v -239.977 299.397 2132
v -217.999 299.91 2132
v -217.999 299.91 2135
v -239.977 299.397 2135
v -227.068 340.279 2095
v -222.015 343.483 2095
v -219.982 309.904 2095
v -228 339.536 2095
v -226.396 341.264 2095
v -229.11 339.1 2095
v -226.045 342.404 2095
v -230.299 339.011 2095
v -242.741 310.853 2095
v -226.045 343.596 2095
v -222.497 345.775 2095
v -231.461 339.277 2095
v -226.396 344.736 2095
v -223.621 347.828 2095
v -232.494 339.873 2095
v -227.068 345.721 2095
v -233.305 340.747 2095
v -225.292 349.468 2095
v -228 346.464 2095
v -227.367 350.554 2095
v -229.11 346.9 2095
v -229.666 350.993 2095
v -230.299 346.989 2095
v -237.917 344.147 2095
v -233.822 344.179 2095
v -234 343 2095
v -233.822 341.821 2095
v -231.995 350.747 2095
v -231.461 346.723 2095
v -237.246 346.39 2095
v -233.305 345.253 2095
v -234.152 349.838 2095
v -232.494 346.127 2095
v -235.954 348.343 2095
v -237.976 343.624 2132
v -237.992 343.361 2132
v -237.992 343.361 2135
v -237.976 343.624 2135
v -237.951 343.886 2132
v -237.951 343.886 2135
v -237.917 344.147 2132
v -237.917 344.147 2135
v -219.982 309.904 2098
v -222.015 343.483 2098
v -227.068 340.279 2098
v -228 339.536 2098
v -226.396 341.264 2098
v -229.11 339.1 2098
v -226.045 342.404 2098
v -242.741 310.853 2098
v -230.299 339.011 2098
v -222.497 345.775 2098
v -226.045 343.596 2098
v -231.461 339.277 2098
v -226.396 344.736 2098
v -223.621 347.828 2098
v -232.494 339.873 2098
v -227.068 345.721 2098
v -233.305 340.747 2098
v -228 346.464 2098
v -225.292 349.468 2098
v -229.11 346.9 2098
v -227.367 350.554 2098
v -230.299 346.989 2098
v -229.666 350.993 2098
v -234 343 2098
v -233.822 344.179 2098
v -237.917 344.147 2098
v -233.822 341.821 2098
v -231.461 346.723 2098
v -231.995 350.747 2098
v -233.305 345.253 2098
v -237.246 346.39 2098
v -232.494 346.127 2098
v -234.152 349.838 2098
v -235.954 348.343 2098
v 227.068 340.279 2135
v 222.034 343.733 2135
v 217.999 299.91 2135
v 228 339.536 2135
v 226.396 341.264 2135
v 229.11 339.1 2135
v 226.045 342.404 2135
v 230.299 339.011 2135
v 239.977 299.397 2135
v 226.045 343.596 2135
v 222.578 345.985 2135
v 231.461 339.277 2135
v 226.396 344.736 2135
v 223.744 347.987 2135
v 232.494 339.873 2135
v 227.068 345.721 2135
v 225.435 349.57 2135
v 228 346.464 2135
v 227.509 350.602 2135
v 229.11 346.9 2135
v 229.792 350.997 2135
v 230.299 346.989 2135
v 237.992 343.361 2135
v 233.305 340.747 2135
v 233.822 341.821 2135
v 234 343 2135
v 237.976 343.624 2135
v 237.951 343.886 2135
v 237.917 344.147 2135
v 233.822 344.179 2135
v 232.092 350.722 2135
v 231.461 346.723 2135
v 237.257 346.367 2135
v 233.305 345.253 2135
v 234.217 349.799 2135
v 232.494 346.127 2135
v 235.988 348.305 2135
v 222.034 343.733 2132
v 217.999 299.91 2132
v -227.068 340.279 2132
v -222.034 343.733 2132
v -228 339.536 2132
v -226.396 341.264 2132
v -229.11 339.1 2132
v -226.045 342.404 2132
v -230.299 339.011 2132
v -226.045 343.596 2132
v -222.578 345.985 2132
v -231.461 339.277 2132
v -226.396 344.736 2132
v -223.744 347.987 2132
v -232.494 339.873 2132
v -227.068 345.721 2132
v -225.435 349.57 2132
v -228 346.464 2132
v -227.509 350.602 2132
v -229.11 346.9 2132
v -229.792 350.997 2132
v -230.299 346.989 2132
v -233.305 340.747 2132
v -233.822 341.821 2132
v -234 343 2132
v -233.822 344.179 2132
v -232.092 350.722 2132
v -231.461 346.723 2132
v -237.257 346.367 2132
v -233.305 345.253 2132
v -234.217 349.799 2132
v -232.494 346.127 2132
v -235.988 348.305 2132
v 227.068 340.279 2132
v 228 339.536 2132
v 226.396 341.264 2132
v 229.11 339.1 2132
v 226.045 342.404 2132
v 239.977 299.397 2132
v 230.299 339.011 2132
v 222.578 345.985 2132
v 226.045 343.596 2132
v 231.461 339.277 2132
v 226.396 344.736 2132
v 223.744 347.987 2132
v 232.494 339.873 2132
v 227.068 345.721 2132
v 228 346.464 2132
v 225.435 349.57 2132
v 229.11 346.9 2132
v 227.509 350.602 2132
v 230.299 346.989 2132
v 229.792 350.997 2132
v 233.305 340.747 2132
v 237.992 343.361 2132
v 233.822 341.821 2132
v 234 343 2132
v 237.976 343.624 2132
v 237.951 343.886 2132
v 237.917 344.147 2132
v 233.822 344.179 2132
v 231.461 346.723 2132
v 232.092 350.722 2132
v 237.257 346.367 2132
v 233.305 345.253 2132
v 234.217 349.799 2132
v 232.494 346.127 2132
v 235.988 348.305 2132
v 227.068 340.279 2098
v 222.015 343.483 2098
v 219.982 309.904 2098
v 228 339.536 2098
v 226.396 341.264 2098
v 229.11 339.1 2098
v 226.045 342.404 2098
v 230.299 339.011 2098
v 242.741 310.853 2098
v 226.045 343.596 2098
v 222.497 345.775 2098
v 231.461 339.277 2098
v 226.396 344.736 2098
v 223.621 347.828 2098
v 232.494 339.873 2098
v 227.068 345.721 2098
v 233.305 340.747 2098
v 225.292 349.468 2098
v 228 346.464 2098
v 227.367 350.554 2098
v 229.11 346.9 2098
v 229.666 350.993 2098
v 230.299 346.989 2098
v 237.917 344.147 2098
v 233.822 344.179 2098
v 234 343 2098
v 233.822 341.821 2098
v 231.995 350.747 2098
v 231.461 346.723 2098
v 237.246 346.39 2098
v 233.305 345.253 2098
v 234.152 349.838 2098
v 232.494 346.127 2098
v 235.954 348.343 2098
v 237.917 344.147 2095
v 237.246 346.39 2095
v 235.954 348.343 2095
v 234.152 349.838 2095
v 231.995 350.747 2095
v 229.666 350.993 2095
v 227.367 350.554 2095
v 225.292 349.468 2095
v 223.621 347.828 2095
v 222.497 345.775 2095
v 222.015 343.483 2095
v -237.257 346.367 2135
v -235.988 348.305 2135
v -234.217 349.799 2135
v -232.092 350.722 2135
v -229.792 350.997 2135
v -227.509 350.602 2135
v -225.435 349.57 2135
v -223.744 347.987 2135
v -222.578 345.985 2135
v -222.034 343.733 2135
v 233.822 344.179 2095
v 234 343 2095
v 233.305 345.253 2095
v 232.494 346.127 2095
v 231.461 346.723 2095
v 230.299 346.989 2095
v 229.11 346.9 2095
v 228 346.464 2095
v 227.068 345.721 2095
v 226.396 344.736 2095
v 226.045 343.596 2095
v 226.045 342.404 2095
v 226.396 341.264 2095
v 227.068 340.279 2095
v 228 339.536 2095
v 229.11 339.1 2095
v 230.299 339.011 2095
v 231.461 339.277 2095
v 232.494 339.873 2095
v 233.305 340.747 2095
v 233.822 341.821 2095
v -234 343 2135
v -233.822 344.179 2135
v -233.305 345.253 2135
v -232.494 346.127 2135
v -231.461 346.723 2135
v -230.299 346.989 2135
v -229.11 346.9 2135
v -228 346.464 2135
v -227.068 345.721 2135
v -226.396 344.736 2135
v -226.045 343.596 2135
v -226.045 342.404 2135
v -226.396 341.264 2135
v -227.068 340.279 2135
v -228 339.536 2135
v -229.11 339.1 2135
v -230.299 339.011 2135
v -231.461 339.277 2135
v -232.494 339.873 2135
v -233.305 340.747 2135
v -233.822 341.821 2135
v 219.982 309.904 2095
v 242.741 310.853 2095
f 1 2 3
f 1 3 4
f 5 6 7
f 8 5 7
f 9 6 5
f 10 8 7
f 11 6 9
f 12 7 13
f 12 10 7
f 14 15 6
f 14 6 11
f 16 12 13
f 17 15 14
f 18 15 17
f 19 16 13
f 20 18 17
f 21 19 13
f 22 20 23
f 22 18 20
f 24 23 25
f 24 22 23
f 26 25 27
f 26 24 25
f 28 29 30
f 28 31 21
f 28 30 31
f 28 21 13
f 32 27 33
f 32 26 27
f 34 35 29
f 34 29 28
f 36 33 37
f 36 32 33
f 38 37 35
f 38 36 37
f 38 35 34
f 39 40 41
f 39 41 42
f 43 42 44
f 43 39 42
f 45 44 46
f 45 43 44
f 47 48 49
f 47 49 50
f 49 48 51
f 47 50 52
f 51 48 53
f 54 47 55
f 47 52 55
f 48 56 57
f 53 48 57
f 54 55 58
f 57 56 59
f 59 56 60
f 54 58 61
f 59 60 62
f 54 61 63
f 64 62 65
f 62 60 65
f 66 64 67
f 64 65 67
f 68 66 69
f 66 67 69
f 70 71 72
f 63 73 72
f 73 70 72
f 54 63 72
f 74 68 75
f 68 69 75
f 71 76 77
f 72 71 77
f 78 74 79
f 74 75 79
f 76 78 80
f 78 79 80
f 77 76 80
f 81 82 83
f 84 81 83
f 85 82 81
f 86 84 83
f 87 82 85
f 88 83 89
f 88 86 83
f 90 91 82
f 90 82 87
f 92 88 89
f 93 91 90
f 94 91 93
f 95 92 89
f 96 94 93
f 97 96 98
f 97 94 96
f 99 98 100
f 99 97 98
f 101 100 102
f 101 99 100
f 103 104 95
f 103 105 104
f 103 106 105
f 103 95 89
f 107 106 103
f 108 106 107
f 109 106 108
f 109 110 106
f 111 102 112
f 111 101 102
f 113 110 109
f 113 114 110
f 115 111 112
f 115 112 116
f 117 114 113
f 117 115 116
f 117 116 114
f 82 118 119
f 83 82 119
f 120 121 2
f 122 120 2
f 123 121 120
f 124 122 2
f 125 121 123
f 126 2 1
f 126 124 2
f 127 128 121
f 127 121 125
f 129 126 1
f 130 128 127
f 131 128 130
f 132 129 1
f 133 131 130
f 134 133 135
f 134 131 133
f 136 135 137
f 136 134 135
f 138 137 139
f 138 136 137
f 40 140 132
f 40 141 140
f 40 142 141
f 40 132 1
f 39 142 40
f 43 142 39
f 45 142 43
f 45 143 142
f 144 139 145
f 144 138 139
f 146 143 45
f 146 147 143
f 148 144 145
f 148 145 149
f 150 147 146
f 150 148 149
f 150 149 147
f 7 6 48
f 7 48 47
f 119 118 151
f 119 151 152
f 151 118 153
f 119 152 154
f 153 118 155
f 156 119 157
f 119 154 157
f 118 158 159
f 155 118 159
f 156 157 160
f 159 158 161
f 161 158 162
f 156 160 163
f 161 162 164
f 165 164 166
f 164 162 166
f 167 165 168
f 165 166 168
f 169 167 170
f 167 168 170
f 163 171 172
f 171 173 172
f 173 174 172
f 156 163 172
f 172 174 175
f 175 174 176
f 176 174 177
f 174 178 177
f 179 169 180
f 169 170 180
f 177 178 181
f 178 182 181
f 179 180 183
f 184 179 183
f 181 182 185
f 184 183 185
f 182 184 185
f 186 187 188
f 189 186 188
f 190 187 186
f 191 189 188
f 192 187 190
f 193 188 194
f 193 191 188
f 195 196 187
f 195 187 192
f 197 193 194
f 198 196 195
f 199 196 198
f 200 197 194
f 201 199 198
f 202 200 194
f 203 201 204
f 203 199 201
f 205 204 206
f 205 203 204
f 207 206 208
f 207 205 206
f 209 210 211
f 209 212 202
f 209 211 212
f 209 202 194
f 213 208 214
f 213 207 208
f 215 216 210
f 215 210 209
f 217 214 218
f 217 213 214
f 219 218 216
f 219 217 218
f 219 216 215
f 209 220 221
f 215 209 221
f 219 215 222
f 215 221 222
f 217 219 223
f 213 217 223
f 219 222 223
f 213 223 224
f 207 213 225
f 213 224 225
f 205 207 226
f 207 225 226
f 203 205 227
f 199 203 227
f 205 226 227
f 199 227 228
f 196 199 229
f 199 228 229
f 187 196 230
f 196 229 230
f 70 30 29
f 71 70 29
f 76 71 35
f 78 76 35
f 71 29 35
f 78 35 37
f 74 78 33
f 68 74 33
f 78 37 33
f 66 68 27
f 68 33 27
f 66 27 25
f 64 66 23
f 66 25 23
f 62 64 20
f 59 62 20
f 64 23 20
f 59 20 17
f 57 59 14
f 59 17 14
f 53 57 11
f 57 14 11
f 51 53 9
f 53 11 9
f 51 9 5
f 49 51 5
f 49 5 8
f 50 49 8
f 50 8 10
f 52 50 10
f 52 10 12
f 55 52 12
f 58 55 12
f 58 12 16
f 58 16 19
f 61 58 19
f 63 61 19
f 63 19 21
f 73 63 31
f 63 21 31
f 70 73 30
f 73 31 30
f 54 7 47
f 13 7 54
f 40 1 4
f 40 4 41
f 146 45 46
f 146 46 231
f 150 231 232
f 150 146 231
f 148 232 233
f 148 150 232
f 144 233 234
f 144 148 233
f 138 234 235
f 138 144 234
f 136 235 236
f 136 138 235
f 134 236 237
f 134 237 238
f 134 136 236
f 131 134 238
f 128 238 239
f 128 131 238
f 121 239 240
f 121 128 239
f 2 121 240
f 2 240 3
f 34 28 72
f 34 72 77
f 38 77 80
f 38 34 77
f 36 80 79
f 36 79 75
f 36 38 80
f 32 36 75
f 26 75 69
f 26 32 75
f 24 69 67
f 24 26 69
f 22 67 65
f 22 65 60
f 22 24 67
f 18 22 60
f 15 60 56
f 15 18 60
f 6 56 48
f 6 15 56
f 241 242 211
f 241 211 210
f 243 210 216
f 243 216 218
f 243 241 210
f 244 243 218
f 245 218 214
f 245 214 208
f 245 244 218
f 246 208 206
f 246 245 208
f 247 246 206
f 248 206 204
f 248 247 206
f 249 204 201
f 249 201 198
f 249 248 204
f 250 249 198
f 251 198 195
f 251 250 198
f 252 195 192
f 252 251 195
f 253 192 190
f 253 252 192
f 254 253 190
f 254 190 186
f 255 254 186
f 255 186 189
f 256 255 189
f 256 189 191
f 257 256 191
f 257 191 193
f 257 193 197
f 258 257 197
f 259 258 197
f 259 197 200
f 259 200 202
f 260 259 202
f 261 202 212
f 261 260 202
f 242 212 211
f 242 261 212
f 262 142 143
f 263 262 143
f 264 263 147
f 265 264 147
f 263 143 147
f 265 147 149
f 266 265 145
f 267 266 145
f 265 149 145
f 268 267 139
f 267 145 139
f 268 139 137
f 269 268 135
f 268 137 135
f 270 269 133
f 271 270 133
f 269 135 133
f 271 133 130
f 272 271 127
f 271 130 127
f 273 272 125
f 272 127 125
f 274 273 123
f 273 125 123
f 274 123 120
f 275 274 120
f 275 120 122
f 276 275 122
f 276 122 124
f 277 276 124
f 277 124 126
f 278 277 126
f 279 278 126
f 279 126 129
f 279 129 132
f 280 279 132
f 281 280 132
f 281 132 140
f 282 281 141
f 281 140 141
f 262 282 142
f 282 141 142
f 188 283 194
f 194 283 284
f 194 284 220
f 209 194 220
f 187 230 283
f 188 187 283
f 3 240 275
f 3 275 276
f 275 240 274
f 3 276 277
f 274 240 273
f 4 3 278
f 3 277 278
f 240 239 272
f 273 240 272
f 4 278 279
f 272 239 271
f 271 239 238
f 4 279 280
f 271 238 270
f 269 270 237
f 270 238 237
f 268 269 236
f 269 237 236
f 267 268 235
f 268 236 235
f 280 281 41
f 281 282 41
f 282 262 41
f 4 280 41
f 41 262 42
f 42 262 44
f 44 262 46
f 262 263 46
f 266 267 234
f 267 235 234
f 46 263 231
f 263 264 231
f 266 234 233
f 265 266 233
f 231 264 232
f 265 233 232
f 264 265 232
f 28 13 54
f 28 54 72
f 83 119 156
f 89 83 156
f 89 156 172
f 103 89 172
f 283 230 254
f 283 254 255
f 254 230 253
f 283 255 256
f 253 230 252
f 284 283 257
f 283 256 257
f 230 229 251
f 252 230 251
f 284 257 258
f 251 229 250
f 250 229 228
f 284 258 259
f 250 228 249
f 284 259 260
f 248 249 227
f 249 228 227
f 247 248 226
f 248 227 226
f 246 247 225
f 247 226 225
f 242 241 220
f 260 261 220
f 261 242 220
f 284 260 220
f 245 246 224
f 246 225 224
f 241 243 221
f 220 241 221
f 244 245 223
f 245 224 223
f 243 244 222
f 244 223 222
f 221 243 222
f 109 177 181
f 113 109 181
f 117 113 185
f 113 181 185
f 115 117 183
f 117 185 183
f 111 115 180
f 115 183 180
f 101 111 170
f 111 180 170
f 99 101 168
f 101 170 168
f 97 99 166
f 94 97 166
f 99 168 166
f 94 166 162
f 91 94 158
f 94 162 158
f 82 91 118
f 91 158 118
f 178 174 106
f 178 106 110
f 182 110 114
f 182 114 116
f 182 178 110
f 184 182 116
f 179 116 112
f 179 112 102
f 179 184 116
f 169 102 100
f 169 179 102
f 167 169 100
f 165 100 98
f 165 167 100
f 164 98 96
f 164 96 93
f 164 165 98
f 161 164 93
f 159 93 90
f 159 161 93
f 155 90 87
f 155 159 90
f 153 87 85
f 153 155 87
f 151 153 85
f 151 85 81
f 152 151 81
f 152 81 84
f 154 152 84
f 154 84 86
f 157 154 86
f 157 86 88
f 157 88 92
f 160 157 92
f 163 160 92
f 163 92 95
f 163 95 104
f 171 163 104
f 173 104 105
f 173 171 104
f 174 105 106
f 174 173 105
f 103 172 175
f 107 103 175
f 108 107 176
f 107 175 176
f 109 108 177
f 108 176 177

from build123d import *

# Parameters (mm, degrees)
BOSS_EXTRUDE1_START       = 2132
BOSS_EXTRUDE1_OUTLINE_R   = 4
BOSS_EXTRUDE1_DEPTH       = 3
BOSS_EXTRUDE1_START_2     = 2095
BOSS_EXTRUDE1_2_OUTLINE_R = 4
BOSS_EXTRUDE1_2_DEPTH     = 3


# Read off the part's stored shape, not the designer's step: Boss-Extrude1
with BuildPart() as part:
    # Boss-Extrude1 outline → Boss-Extrude1 (new body)
    with BuildSketch(Plane.XY.offset(BOSS_EXTRUDE1_START)):
        with BuildLine():
            ThreePointArc((237.917335534, 344.147082404), (229.791723167, 350.997288338), (222.033689788, 343.73341776))
            Line((222.033689788, 343.73341776), (217.999104301, 299.910154527))
            Line((217.999104301, 299.910154527), (239.977266453, 299.397128138))
            Line((239.977266453, 299.397128138), (237.991854695, 343.360913469))
            ThreePointArc((237.991854695, 343.360913469), (237.964301528, 343.754917985), (237.917335534, 344.147082404))
        make_face()
        with Locations((230, 343)):
            Circle(BOSS_EXTRUDE1_OUTLINE_R, mode=Mode.SUBTRACT)
    extrude(amount=BOSS_EXTRUDE1_DEPTH)


with BuildPart() as body_2:
    # Boss-Extrude1 2 outline → Boss-Extrude1 2 (new body)
    with BuildSketch(Plane.XY.offset(BOSS_EXTRUDE1_START_2)):
        with BuildLine():
            Line((222.014622911, 343.483479836), (219.981515577, 309.903736695))
            Line((219.981515577, 309.903736695), (242.740994086, 310.853464501))
            Line((242.740994086, 310.853464501), (237.917335534, 344.147082404))
            ThreePointArc((237.917335534, 344.147082404), (229.66645914, 350.993043882), (222.014622911, 343.483479836))
        make_face()
        with Locations((230, 343)):
            Circle(BOSS_EXTRUDE1_2_OUTLINE_R, mode=Mode.SUBTRACT)
    extrude(amount=BOSS_EXTRUDE1_2_DEPTH)


with BuildPart() as body_3:
    # Mirror1: mirrored copy
    add(part.part.mirror(Plane(origin=(0, 0, 0), x_dir=(0, 0, 1), z_dir=(1, 0, 0))))


with BuildPart() as body_4:
    # Mirror1 2: mirrored copy
    add(body_2.part.mirror(Plane(origin=(0, 0, 0), x_dir=(0, 0, 1), z_dir=(1, 0, 0))))


solid = Compound([part.part, body_2.part, body_3.part, body_4.part])
